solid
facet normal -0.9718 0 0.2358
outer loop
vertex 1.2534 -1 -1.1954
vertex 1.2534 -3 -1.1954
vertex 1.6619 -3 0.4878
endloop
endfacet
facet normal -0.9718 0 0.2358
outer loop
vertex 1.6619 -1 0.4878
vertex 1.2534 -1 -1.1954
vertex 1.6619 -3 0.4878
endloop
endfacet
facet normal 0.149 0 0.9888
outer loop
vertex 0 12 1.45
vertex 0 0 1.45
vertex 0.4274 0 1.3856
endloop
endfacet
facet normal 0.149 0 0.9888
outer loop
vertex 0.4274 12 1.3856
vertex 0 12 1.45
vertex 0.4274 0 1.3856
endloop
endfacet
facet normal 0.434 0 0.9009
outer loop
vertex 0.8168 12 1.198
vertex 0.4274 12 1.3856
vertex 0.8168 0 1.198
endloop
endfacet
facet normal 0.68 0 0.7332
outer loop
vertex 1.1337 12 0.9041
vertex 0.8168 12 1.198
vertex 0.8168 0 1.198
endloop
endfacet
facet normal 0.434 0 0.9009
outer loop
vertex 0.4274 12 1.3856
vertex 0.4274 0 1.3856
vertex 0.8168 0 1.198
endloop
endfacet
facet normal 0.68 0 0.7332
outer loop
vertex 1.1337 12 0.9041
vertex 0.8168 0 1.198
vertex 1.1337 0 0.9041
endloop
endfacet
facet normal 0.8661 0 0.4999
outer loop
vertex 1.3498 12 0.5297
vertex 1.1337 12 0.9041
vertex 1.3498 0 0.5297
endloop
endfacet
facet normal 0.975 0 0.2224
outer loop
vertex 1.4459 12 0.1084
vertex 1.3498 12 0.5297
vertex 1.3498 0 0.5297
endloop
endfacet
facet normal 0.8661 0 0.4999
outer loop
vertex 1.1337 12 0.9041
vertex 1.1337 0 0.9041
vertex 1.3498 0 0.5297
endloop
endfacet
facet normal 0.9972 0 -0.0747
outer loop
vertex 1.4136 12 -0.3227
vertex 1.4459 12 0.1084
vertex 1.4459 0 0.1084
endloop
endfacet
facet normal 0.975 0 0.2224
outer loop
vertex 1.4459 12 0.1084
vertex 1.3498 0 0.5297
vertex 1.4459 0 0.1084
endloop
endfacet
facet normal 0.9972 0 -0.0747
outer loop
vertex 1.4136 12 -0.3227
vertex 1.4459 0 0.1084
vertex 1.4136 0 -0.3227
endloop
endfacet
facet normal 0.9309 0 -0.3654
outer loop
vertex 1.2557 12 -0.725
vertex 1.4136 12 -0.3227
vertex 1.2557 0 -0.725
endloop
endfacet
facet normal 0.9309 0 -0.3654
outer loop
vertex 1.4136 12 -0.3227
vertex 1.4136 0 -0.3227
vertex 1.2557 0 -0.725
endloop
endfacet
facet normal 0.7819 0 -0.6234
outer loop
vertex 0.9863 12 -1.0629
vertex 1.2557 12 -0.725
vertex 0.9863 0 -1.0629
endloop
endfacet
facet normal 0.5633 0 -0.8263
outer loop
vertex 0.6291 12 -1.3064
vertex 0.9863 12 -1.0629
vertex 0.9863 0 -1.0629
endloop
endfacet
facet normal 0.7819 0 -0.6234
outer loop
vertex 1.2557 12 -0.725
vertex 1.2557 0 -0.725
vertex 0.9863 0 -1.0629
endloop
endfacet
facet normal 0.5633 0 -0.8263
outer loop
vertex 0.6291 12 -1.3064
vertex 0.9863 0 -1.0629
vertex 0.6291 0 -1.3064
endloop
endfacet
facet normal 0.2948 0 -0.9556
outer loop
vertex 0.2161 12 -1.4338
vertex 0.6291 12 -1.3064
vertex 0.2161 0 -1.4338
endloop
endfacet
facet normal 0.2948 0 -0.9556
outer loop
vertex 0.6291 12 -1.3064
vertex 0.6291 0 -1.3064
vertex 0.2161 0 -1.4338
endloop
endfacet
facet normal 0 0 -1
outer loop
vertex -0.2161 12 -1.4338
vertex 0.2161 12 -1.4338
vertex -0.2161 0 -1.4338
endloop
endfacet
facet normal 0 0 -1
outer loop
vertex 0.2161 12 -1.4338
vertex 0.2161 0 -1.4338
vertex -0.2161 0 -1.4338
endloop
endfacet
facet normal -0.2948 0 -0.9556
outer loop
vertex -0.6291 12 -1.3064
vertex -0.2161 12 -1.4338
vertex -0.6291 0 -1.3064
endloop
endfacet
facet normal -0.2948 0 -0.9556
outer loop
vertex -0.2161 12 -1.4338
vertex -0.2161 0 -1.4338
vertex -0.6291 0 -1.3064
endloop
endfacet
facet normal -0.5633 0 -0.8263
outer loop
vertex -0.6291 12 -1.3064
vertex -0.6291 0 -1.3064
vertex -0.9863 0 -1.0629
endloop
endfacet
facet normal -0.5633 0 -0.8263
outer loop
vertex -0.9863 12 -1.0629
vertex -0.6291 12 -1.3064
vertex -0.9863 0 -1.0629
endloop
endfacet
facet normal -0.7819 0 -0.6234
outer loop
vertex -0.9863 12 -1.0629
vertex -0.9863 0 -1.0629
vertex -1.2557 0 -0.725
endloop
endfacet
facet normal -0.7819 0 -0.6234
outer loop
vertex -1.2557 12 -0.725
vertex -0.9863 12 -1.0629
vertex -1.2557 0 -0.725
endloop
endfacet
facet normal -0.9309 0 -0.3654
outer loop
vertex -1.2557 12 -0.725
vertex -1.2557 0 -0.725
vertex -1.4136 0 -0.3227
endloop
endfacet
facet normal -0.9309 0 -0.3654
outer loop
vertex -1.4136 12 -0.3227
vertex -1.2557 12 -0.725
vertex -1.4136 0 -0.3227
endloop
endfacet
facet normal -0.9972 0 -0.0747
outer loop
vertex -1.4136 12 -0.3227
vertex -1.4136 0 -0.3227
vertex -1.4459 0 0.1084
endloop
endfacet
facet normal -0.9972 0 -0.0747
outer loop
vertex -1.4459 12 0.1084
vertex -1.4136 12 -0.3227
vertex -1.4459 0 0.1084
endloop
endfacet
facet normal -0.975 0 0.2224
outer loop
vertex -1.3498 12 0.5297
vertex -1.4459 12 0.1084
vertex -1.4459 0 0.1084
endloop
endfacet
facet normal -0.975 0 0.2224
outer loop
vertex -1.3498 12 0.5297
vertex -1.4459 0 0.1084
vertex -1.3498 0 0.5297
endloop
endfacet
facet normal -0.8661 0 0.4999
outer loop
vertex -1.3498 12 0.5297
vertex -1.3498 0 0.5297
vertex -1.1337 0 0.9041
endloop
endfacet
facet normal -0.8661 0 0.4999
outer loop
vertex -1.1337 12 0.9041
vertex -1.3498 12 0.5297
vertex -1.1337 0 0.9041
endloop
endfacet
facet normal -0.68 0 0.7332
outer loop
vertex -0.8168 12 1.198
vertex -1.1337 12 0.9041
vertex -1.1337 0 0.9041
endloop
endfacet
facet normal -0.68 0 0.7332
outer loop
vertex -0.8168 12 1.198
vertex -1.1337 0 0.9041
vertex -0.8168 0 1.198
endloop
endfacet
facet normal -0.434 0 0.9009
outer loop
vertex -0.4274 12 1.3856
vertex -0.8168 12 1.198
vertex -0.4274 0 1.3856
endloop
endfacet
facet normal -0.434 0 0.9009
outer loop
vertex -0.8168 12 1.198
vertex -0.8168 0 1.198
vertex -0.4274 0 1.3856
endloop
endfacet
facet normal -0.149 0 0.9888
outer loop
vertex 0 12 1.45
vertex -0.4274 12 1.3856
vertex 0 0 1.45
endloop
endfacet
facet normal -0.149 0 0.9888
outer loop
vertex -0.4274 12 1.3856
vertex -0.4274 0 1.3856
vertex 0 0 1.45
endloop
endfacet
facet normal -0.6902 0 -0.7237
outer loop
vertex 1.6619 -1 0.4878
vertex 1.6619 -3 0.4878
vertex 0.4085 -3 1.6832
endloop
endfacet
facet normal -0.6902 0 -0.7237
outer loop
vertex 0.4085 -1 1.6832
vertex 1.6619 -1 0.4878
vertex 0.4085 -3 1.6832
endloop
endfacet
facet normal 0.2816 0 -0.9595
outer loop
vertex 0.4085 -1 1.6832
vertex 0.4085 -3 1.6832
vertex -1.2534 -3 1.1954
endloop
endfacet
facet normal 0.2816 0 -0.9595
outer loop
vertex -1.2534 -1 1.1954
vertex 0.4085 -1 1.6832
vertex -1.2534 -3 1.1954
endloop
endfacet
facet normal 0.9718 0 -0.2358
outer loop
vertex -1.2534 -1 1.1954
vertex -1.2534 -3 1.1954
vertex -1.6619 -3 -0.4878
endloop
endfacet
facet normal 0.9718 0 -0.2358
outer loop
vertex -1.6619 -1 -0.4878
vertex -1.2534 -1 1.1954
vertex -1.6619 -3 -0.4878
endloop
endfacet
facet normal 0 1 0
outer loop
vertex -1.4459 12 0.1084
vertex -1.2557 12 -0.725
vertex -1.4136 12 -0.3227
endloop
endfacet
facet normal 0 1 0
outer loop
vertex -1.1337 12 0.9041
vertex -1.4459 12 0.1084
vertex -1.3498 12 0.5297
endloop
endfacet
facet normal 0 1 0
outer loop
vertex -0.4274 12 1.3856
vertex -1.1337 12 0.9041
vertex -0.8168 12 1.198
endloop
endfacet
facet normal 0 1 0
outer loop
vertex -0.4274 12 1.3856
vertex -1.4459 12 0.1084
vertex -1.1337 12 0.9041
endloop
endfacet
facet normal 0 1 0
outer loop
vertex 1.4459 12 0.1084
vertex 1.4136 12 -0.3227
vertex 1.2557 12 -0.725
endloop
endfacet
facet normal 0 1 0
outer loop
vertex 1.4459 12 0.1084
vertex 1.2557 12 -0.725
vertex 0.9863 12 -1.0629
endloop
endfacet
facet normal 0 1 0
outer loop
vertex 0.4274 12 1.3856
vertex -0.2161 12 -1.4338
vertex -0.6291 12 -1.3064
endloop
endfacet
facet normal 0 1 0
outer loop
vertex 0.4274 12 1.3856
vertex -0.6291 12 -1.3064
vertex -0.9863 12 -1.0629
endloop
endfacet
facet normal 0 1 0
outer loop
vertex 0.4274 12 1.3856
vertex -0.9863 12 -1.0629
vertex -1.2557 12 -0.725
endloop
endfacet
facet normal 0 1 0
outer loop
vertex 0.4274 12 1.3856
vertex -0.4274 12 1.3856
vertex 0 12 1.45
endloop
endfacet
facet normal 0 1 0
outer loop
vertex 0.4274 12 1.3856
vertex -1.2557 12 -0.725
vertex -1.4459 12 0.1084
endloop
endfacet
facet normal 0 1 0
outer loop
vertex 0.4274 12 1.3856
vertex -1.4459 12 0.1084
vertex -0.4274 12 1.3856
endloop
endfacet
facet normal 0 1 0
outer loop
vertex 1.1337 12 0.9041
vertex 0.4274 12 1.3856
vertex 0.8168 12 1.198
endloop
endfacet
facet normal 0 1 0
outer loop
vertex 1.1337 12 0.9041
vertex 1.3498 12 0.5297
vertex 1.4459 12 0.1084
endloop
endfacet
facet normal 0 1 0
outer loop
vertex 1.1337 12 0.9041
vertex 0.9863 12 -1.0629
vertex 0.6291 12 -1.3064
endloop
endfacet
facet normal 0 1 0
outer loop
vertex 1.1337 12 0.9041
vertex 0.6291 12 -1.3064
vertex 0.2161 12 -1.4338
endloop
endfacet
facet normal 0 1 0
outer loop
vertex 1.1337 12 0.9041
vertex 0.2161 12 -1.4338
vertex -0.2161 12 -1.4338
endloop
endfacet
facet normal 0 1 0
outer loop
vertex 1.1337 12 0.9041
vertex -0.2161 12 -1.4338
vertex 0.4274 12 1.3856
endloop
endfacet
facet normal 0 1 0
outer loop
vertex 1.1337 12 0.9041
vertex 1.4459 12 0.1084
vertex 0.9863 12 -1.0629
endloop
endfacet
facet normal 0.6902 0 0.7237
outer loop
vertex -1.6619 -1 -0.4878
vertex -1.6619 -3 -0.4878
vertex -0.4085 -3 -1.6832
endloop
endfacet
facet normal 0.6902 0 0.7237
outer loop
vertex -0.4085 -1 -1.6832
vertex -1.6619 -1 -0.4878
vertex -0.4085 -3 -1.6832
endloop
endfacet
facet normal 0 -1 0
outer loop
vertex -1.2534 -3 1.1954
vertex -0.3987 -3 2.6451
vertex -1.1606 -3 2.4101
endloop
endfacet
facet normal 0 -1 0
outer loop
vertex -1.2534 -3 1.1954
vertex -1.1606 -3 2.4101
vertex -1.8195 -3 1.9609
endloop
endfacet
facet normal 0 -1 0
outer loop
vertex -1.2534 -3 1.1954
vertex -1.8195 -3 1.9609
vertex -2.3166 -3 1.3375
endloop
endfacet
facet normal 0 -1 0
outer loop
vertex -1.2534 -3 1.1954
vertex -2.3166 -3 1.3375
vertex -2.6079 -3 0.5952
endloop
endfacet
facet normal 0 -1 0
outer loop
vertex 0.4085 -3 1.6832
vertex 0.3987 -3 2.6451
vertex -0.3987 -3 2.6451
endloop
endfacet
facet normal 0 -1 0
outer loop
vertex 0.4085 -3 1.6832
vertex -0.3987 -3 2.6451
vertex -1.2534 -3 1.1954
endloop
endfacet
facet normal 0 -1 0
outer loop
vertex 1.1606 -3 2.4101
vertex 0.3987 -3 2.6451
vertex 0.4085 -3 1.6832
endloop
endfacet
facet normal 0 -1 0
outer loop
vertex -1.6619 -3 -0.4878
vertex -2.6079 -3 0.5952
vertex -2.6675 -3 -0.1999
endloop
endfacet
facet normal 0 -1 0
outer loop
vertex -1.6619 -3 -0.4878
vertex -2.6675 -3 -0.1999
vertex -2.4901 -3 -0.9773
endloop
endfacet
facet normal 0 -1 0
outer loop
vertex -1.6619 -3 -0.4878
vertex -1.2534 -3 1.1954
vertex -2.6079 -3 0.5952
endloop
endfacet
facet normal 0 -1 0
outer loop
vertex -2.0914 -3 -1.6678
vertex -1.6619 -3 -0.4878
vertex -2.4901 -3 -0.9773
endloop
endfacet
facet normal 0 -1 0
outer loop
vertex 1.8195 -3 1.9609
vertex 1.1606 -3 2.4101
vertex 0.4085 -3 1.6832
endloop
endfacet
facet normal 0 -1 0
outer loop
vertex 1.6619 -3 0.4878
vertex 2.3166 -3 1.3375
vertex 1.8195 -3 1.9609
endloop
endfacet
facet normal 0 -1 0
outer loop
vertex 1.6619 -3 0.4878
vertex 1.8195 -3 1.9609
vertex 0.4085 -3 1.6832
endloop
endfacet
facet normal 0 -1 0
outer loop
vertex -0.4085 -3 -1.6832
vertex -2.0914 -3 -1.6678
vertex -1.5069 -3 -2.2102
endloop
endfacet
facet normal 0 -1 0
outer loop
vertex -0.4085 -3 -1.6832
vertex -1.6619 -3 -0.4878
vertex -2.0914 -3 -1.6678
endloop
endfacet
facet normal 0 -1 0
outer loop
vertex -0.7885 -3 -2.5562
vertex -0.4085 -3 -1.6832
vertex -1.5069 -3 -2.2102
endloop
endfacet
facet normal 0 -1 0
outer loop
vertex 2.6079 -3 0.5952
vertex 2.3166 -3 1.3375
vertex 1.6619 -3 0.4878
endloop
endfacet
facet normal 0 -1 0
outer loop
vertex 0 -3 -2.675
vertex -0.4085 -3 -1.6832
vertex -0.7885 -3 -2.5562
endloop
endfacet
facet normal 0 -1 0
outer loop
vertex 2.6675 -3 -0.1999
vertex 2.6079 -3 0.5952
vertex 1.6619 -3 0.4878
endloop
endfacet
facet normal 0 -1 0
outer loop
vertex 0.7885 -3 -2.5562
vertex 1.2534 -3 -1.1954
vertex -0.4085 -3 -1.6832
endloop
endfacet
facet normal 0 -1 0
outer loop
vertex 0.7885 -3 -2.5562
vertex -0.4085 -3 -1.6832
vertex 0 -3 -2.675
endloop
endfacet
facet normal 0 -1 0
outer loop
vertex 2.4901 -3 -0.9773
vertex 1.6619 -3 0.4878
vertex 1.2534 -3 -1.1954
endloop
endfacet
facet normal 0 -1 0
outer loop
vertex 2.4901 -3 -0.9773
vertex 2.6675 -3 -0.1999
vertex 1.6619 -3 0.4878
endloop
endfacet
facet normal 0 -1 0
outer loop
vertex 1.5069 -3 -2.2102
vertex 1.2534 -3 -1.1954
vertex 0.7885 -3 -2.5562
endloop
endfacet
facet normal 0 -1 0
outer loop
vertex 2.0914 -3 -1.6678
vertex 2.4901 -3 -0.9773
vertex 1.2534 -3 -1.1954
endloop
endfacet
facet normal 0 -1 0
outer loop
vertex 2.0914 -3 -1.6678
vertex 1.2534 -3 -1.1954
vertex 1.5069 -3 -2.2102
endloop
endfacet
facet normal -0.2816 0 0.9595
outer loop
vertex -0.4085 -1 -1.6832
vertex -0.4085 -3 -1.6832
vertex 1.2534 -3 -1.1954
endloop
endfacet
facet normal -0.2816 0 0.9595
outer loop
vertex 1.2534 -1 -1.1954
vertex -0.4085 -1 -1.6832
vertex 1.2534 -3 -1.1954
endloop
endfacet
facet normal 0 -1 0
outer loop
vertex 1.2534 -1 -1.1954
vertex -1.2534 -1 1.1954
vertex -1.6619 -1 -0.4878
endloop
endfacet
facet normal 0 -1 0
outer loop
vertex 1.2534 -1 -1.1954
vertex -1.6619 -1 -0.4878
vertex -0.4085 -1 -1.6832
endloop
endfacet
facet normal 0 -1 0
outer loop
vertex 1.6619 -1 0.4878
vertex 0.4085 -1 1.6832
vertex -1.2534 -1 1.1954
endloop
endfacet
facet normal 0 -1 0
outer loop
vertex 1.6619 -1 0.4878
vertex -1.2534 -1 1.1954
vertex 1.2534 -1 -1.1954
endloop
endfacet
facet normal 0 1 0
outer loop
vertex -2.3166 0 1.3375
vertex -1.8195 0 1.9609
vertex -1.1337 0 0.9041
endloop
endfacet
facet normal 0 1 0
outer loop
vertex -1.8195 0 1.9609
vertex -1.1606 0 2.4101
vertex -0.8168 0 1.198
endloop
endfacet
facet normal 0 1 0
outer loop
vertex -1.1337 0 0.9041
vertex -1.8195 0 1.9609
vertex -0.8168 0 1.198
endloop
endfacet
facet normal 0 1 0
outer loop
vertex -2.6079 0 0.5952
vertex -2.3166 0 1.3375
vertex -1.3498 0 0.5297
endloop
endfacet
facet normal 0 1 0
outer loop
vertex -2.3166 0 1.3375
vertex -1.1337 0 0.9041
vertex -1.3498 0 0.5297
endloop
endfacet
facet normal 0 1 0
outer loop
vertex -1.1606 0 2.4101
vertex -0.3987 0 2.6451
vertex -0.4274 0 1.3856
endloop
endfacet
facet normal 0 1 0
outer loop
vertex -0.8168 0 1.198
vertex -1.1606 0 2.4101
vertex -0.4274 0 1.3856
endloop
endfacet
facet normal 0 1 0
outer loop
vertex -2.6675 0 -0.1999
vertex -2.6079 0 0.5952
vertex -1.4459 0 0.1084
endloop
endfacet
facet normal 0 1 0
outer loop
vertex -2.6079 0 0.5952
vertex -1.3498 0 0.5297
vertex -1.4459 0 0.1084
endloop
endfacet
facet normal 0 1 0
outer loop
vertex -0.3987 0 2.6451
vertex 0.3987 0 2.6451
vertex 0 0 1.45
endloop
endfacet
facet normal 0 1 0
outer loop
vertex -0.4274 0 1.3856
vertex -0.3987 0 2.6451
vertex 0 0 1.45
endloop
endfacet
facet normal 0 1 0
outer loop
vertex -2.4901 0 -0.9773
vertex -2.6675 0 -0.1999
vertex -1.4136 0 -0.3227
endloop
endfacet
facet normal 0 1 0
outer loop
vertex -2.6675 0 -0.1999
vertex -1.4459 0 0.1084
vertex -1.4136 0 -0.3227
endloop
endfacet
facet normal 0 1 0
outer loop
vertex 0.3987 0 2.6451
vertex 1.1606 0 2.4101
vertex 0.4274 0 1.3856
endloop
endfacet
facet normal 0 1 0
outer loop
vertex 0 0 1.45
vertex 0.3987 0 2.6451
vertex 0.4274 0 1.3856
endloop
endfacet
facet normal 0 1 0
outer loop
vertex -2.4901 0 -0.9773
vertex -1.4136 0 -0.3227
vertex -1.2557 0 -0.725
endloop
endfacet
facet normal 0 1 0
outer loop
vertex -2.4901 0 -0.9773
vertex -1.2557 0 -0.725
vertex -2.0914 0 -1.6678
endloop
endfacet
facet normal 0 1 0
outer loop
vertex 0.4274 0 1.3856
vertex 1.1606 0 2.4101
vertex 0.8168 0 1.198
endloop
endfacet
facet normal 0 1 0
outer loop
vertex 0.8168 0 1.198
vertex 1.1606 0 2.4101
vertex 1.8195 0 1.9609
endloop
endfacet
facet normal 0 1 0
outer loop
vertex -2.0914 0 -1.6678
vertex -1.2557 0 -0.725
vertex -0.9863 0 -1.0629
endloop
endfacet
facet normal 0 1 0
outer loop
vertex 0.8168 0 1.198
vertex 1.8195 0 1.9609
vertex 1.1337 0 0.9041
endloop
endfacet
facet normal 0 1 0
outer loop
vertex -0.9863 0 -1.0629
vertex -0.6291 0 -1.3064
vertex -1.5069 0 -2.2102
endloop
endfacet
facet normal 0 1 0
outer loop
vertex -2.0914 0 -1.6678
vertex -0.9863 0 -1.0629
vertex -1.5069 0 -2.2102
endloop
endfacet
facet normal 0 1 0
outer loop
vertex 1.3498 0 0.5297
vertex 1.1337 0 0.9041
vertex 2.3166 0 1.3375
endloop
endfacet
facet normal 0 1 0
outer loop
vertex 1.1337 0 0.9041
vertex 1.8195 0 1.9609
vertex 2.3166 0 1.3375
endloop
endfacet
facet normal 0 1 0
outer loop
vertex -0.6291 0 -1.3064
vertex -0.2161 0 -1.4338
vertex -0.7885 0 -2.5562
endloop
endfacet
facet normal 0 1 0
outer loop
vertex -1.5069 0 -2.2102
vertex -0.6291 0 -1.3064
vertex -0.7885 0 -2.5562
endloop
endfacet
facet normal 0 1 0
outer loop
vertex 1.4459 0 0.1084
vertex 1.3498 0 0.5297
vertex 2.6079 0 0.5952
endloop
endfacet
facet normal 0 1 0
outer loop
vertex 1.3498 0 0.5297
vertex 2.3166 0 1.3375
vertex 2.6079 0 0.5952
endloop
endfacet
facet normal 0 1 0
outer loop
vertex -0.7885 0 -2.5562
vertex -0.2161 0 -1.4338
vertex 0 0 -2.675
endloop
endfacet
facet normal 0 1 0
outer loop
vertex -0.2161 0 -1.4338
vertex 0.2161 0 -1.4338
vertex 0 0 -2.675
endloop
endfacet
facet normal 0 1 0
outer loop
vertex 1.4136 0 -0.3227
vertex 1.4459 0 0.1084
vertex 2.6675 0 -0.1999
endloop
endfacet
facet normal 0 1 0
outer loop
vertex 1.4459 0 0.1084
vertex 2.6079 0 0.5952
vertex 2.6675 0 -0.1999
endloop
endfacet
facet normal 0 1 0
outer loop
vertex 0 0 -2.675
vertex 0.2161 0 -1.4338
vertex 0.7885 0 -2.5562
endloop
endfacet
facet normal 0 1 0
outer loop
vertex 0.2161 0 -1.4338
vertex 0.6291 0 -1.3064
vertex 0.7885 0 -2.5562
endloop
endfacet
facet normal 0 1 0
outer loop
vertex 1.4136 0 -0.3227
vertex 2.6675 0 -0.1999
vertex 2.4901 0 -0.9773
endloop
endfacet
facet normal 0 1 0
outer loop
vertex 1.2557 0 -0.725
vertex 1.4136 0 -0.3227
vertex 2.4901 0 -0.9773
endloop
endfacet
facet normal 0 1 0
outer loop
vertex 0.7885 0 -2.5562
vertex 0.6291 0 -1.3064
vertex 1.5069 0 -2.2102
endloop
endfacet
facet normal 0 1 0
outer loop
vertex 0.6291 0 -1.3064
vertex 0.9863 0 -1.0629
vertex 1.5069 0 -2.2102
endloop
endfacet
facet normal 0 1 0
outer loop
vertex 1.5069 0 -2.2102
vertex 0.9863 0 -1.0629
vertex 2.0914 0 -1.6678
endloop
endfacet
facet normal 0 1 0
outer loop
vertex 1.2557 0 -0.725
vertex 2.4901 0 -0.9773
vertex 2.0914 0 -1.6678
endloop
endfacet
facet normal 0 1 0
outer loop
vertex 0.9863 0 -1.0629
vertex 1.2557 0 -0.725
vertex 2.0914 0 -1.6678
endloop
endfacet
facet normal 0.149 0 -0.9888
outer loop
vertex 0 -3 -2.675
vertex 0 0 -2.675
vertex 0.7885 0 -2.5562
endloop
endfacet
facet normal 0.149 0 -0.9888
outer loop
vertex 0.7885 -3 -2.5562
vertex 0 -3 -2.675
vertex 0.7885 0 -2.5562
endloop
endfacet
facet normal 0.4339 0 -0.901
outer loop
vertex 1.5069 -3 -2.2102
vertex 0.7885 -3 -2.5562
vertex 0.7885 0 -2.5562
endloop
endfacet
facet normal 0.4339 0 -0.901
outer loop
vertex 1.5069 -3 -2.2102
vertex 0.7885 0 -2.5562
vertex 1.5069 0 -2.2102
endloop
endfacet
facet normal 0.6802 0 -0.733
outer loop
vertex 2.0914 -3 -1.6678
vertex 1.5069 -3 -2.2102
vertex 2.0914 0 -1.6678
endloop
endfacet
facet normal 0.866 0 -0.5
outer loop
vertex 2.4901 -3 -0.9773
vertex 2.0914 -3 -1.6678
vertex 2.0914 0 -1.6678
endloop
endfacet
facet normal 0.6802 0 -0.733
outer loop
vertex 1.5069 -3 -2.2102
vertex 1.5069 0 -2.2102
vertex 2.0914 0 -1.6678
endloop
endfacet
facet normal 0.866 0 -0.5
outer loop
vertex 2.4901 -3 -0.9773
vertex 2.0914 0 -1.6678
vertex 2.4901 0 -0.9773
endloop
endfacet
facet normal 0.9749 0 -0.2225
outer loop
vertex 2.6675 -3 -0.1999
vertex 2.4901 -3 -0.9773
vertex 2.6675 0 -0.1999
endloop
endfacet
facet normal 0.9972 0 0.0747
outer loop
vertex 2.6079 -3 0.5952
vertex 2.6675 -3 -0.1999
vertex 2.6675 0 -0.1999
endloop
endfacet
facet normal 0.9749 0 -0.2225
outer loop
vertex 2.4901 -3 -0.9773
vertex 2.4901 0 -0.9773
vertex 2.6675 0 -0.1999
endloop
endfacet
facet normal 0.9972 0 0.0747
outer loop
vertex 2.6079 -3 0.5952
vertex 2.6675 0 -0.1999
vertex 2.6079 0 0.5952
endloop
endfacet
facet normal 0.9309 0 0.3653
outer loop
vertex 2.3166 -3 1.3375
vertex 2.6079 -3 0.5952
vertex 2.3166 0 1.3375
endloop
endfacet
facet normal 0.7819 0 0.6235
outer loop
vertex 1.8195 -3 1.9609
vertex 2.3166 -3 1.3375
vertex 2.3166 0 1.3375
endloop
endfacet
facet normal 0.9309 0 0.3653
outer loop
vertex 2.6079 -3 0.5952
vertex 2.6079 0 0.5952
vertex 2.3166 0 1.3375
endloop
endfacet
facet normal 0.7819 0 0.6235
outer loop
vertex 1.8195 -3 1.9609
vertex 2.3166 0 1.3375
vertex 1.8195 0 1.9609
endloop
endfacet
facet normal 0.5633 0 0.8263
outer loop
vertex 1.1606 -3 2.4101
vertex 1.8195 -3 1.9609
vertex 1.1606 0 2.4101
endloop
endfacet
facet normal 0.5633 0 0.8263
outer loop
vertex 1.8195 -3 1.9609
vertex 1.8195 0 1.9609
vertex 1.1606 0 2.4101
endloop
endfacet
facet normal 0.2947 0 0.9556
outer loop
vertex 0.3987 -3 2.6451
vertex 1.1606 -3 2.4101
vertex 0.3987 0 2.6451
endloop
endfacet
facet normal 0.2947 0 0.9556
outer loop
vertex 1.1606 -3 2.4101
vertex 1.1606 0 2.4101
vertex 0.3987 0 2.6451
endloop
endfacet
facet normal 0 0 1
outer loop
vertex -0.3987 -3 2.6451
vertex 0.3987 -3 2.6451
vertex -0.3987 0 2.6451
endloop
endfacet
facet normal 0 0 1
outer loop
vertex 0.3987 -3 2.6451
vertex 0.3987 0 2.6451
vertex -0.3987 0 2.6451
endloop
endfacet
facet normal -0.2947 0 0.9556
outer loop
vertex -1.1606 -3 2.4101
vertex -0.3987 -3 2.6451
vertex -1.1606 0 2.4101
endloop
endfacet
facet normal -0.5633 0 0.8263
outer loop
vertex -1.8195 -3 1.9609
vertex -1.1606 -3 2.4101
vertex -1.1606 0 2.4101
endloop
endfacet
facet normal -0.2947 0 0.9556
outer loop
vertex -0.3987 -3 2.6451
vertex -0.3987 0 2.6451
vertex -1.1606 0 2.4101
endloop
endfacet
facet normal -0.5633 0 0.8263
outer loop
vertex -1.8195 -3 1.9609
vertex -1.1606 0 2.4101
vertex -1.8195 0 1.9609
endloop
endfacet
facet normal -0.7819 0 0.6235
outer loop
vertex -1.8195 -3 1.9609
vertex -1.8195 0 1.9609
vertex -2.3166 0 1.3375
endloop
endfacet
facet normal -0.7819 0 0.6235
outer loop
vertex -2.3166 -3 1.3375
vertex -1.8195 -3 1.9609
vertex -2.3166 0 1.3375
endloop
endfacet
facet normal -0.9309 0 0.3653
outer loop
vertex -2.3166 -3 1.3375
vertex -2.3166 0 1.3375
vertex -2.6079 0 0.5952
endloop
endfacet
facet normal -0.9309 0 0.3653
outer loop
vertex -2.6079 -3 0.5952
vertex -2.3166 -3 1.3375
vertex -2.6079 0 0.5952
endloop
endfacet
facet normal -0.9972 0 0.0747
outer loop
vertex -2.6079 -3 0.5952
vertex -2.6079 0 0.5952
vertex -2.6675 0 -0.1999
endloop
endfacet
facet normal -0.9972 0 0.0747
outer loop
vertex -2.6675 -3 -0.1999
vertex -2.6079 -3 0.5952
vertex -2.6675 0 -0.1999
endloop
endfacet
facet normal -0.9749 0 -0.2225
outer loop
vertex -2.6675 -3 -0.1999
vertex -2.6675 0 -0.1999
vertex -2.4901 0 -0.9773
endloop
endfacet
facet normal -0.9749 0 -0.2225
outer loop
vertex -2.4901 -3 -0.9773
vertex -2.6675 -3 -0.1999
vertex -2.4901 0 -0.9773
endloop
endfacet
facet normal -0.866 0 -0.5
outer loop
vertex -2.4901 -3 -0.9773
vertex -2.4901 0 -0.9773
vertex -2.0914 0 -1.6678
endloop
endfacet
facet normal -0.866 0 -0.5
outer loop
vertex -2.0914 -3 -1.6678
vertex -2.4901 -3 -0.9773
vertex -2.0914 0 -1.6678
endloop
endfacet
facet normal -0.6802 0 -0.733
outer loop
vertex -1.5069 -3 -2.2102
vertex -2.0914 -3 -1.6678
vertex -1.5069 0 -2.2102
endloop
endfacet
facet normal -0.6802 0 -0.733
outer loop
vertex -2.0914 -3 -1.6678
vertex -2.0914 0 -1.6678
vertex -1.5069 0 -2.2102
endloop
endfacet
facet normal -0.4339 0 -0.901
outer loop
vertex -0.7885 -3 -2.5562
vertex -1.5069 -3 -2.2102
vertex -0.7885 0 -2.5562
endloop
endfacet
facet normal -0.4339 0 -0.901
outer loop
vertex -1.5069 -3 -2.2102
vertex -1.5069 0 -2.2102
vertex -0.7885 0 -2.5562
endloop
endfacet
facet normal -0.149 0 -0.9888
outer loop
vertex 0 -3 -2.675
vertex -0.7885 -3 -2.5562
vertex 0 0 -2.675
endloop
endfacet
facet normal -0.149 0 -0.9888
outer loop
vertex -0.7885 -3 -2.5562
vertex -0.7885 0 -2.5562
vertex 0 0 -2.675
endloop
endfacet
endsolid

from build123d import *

# Parameters (mm, degrees)
SKETCH1_R           = 1.45
BOSS_EXTRUDE1_DEPTH = 12
SKETCH2_R           = 2.675
BOSS_EXTRUDE2_DEPTH = 3
CUT_EXTRUDE1_DEPTH  = 2


with BuildPart() as part:
    # Sketch1 → Boss-Extrude1 (new body)
    with BuildSketch(Plane(origin=(0, 0, 0), x_dir=(1, 0, 0), z_dir=(0, 1, 0))):
        with Locations(Location((0, 0, 0), (0, 0, 270))):
            Circle(SKETCH1_R)
    extrude(amount=BOSS_EXTRUDE1_DEPTH)

    # Sketch2 → Boss-Extrude2 (add)
    with BuildSketch(Plane.XZ):
        with Locations(Location((0, 0, 0), (0, 0, 270))):
            Circle(SKETCH2_R)
    extrude(amount=BOSS_EXTRUDE2_DEPTH)

    # Sketch3 → Cut-Extrude1 (cut)
    with BuildSketch(Plane.XZ.offset(3)):
        Polygon((1.661945535, 0.487787902), (0.408536053, 1.683181004), (-1.253409482, 1.195393102), (-1.661945535, -0.487787902), (-0.408536053, -1.683181004), (1.253409482, -1.195393102), align=None)
    extrude(amount=-CUT_EXTRUDE1_DEPTH, mode=Mode.SUBTRACT)


solid = part.part
